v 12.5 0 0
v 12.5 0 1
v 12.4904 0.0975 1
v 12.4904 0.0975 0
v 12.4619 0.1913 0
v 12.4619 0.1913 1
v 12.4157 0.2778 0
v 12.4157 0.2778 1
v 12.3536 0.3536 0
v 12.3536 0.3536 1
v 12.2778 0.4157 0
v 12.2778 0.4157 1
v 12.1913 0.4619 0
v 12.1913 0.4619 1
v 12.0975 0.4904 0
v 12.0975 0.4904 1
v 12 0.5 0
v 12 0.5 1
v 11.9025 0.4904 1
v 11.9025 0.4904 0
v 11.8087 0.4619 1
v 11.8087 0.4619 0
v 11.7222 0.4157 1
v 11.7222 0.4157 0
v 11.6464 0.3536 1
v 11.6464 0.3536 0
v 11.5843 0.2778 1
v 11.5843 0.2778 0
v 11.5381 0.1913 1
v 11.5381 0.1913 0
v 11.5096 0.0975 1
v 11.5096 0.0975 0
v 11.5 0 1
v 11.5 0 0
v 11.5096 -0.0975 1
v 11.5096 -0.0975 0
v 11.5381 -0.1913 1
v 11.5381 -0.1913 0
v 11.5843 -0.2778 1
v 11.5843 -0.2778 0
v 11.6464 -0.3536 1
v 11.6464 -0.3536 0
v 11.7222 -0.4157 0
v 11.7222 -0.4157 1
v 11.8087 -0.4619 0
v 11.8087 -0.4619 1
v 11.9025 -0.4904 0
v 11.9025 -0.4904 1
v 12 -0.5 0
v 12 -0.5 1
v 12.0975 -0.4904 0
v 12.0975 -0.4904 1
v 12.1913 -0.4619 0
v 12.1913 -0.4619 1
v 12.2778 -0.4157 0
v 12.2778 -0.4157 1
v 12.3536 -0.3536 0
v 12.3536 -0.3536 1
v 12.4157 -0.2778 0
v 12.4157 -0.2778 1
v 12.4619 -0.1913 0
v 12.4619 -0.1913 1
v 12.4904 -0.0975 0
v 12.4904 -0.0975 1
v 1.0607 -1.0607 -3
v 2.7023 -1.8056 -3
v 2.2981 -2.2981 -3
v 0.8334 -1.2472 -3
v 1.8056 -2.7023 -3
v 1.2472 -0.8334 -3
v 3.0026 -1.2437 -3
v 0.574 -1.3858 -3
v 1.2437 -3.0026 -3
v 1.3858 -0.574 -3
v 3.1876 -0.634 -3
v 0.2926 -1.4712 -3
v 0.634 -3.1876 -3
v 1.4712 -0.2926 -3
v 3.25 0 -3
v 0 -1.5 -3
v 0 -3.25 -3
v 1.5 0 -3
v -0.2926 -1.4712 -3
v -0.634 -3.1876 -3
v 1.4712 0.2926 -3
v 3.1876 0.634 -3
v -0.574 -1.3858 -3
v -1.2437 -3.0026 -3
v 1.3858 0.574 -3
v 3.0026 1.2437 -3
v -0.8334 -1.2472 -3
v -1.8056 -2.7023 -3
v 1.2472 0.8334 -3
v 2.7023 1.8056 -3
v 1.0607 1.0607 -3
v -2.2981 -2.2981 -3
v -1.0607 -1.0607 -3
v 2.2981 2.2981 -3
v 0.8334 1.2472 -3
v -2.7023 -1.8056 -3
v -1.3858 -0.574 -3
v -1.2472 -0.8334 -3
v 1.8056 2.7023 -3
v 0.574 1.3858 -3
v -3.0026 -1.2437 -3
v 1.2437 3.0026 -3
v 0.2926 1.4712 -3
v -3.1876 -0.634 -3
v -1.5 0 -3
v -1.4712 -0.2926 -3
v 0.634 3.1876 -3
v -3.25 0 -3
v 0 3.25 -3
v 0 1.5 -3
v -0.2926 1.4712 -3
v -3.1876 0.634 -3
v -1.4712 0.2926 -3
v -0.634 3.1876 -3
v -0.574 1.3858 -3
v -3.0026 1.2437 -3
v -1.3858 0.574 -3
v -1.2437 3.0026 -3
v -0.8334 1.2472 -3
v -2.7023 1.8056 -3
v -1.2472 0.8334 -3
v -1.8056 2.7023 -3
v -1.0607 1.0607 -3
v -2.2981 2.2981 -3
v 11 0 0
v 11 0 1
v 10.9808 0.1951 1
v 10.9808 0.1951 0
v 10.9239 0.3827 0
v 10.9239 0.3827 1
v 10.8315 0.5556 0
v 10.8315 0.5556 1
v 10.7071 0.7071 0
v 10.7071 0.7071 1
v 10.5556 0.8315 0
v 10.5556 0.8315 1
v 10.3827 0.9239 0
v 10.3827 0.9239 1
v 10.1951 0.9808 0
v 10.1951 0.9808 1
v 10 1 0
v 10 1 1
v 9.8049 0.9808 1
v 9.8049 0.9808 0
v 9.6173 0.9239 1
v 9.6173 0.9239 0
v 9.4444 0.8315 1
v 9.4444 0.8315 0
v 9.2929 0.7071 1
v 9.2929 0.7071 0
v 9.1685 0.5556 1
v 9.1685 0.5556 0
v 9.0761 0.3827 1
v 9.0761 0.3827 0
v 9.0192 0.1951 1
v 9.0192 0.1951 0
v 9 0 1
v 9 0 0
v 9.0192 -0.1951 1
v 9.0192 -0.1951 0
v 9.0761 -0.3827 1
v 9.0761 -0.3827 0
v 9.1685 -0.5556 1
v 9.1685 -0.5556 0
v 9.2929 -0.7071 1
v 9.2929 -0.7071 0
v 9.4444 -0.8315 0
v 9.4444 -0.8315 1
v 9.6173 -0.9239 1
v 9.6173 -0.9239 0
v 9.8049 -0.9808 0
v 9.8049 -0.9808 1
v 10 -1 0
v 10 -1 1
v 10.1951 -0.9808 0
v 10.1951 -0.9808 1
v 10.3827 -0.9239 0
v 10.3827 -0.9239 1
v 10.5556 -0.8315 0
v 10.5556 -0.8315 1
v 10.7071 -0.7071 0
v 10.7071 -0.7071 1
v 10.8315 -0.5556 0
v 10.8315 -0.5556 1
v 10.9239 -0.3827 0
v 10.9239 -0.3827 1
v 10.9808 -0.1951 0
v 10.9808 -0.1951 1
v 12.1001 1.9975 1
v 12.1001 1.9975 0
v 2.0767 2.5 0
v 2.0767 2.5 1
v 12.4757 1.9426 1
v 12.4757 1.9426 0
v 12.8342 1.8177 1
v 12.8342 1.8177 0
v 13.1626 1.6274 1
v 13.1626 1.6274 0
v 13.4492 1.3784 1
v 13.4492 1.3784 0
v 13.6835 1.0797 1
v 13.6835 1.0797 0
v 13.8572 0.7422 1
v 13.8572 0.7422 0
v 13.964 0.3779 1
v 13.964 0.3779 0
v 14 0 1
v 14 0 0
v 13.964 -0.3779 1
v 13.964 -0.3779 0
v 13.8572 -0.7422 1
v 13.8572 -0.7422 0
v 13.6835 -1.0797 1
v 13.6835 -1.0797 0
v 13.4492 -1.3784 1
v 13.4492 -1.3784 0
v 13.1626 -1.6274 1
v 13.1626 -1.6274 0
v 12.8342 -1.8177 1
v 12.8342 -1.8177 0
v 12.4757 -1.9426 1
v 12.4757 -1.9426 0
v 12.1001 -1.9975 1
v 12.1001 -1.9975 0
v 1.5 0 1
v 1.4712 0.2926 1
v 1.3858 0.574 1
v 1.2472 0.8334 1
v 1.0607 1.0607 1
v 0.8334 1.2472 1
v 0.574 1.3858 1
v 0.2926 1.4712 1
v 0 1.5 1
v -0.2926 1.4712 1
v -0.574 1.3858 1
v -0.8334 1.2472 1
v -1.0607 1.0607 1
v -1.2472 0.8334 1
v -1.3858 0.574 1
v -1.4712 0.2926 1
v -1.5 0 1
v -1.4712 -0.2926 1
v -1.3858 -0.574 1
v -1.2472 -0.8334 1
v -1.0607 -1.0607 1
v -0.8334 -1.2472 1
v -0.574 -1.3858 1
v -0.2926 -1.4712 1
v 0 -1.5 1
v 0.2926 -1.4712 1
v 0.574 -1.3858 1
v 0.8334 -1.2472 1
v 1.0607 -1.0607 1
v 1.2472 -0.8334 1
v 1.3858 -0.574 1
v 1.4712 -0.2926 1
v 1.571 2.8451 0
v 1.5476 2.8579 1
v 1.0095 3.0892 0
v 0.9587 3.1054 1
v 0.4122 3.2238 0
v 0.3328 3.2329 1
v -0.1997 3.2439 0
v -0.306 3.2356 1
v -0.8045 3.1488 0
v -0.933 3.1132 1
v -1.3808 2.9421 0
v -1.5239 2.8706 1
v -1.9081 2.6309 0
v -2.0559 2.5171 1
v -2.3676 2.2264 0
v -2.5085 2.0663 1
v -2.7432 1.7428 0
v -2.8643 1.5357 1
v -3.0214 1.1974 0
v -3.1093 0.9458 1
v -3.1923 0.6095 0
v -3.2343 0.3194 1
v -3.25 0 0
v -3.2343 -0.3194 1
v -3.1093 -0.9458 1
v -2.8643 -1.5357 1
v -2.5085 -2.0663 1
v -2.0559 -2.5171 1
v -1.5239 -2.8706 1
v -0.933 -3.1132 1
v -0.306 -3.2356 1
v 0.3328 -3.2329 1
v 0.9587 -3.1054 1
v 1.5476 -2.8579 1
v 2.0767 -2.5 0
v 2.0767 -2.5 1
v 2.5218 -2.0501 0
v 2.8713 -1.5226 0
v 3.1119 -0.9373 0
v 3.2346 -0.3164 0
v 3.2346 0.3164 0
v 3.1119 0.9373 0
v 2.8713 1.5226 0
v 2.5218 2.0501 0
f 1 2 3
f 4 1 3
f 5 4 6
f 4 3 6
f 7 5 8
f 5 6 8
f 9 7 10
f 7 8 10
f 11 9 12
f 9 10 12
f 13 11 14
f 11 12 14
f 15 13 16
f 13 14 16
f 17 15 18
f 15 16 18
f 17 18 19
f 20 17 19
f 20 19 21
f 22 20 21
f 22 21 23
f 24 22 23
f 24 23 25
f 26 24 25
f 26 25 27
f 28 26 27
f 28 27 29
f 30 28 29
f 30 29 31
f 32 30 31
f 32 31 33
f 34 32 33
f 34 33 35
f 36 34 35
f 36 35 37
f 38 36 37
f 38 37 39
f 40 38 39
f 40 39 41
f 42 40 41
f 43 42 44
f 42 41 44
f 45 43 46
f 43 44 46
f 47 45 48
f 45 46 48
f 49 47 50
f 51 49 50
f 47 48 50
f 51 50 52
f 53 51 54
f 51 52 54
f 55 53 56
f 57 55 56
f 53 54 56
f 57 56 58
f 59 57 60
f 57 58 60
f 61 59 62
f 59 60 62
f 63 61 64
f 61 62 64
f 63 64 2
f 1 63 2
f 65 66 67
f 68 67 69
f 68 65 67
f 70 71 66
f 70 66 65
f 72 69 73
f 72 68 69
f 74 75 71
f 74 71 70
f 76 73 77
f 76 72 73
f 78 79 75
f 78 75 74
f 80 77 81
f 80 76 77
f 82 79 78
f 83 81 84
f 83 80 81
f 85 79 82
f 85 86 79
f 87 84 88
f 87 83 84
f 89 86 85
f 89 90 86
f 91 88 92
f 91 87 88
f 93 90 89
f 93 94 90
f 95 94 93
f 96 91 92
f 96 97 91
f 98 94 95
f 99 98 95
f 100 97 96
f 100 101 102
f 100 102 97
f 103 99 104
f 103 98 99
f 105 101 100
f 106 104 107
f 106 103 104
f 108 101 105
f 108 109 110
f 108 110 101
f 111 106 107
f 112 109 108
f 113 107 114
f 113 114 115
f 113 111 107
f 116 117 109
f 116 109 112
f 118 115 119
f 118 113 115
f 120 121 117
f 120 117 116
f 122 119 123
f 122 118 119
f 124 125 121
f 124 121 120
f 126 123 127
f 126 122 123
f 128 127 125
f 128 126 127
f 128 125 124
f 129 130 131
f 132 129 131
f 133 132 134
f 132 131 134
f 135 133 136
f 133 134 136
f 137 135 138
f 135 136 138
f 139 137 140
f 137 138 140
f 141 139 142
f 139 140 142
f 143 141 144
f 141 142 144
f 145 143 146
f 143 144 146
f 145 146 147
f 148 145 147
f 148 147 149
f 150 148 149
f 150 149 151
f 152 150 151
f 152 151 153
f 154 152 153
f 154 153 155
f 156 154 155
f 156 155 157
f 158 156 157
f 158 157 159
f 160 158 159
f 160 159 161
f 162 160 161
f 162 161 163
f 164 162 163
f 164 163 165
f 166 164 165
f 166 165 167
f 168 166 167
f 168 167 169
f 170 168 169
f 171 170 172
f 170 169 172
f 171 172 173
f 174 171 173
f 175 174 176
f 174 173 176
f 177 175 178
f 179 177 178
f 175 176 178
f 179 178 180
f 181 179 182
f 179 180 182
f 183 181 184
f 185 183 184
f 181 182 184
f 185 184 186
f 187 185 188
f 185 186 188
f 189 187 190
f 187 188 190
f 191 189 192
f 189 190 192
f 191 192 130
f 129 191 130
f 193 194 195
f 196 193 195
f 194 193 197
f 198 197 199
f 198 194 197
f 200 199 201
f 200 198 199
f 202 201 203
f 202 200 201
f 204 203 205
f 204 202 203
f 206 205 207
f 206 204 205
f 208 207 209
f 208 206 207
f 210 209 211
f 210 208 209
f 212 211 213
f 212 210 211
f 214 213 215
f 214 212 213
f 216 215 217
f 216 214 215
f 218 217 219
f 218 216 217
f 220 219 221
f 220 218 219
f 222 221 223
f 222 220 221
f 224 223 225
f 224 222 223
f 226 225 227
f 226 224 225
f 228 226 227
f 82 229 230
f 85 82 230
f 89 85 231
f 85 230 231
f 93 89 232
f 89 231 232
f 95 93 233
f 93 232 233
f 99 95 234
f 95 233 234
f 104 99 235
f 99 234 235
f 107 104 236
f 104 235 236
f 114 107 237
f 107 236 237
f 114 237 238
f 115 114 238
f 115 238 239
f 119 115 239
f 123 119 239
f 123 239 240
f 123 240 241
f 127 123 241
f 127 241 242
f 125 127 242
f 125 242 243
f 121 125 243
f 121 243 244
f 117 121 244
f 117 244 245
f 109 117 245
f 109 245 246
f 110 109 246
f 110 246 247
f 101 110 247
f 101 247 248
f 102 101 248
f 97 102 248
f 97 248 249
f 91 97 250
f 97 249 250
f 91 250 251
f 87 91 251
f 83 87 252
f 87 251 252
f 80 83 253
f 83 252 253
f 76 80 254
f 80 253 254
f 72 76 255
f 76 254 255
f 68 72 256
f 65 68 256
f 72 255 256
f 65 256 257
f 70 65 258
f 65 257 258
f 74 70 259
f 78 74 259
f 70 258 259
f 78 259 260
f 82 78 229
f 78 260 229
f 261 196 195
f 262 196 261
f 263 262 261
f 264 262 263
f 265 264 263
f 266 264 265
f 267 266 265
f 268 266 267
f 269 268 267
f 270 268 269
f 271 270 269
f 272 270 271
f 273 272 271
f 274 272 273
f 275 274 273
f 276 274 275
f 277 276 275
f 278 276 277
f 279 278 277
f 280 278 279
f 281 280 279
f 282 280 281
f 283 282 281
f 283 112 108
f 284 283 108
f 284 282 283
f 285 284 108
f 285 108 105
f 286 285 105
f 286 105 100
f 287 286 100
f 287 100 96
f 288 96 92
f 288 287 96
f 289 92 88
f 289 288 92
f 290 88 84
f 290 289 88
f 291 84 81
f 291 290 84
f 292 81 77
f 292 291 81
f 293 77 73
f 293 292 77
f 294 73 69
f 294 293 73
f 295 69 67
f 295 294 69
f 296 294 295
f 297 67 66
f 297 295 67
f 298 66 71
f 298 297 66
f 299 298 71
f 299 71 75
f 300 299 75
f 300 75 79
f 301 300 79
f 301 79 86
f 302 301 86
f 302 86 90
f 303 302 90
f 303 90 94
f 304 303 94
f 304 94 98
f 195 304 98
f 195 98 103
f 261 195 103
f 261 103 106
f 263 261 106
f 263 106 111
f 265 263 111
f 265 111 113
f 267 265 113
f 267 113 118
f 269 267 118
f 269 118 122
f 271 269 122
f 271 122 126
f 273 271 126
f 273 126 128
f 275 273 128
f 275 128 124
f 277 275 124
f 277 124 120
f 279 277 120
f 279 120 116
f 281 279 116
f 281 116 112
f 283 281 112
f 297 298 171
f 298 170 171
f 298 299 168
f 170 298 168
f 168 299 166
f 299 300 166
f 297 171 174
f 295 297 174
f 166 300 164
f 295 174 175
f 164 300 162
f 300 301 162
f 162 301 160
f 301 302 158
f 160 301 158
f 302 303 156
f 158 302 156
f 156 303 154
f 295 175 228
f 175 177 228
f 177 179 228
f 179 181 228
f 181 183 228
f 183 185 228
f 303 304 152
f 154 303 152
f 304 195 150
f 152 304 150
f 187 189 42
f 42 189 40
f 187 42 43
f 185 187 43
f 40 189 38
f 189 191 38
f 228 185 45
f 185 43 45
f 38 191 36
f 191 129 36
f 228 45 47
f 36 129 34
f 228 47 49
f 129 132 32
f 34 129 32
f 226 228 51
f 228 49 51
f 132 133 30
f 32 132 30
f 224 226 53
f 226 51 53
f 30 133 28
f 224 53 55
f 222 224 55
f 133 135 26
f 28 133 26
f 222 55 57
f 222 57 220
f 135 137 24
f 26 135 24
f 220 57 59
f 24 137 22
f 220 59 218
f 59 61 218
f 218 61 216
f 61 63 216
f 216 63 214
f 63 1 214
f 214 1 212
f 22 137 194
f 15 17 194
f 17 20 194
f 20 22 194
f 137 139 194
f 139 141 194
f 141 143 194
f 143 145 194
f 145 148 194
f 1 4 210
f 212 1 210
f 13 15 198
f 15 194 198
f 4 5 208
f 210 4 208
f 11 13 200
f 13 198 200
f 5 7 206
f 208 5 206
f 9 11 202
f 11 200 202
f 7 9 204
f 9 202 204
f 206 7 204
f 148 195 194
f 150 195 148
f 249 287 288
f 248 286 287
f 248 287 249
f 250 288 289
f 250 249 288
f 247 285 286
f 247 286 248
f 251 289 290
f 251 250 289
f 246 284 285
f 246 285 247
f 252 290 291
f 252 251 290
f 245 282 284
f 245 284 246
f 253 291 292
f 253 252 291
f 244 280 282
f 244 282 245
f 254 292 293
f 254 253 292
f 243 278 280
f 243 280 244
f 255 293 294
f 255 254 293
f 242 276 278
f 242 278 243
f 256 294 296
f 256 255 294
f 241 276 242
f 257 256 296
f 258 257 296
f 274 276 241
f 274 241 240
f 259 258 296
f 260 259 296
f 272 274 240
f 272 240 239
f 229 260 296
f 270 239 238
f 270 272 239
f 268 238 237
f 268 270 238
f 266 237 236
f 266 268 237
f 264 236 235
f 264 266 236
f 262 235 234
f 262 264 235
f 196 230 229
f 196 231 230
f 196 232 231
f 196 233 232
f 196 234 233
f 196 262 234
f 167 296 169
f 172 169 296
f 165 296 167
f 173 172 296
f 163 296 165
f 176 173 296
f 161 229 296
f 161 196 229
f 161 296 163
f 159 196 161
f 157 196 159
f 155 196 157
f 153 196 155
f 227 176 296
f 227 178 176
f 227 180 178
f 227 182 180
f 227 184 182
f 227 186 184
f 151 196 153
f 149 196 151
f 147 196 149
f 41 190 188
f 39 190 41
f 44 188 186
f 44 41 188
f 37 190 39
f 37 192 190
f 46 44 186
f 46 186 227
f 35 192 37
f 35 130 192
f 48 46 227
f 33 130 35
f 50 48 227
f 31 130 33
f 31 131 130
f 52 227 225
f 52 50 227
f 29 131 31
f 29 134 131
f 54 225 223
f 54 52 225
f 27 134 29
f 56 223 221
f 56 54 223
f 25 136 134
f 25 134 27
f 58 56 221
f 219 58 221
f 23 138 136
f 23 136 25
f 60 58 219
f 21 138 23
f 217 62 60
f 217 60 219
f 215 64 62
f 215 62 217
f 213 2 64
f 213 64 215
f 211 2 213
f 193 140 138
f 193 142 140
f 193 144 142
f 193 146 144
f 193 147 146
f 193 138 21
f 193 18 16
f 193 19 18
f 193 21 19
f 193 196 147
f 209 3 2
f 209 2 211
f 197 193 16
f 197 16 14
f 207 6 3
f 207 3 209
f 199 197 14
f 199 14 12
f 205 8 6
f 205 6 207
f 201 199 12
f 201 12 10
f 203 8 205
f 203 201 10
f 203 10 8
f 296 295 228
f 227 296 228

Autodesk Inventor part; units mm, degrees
ref_plane "YZ Plane" through (0, 0, 0) normal (1, 0, 0) x (0, 1, 0)
ref_plane "XZ Plane" through (0, 0, 0) normal (0, 1, 0) x (-1, 0, 0)
ref_plane "XY Plane" through (0, 0, 0) normal (0, 0, 1) x (1, 0, 0)
sketch "Skizze1" plane through (0, 0, 0) normal (0, 0, 1) x (1, 0, 0)
  circle A0 centre (0, 0) radius 3.25
  circle A1 centre (12, 0) radius 2
  line L0 (0, 0) -> (12, 0) construction
  line L1 (12.1001, 1.9975) -> (2.0767, 2.5)
  line L2 (2.0767, -2.5) -> (12.1001, -1.9975)
  dimension "d0" = 6.5
  dimension "d1" = 12
  dimension "d2" = 4
  dimension "d3" = 2.5
  dimension "d4" = 2.5
extrude "Extrusion1" add sketch "Skizze1" along normal blind 1
sketch "Skizze2" plane through (0, 0, 0) normal (0, 0, -1) x (-1, 0, 0)
  line L0 (-2.0767, -2.5) -> (-12.1001, -1.9975) projected
  circle A0 centre (0, 0) radius 3.25
extrude "Extrusion2" add sketch "Skizze2" along normal blind 3
sketch "Skizze3" plane through (0, 0, 1) normal (0, 0, 1) x (1, 0, 0)
  arc A0 (12.1001, -1.9975) -> (12.1001, 1.9975) centre (12, 0) ccw projected
  circle A1 centre (12, 0) radius 0.5
  circle A2 centre (10, 0) radius 1
  point P0 (0, 0)
  dimension "d9" = 2
  dimension "d10" = 1
  dimension "d11" = 2
extrude "Extrusion3" cut sketch "Skizze3" against normal blind 3.25
sketch "Skizze4" plane through (0, 0, 1) normal (0, 0, 1) x (1, 0, 0)
  circle A0 centre (0, 0) radius 1.5
  dimension "d14" = 3
extrude "Extrusion4" cut sketch "Skizze4" against normal blind 6.25
properties part number "P_Servo_SIMPROP_lever"
